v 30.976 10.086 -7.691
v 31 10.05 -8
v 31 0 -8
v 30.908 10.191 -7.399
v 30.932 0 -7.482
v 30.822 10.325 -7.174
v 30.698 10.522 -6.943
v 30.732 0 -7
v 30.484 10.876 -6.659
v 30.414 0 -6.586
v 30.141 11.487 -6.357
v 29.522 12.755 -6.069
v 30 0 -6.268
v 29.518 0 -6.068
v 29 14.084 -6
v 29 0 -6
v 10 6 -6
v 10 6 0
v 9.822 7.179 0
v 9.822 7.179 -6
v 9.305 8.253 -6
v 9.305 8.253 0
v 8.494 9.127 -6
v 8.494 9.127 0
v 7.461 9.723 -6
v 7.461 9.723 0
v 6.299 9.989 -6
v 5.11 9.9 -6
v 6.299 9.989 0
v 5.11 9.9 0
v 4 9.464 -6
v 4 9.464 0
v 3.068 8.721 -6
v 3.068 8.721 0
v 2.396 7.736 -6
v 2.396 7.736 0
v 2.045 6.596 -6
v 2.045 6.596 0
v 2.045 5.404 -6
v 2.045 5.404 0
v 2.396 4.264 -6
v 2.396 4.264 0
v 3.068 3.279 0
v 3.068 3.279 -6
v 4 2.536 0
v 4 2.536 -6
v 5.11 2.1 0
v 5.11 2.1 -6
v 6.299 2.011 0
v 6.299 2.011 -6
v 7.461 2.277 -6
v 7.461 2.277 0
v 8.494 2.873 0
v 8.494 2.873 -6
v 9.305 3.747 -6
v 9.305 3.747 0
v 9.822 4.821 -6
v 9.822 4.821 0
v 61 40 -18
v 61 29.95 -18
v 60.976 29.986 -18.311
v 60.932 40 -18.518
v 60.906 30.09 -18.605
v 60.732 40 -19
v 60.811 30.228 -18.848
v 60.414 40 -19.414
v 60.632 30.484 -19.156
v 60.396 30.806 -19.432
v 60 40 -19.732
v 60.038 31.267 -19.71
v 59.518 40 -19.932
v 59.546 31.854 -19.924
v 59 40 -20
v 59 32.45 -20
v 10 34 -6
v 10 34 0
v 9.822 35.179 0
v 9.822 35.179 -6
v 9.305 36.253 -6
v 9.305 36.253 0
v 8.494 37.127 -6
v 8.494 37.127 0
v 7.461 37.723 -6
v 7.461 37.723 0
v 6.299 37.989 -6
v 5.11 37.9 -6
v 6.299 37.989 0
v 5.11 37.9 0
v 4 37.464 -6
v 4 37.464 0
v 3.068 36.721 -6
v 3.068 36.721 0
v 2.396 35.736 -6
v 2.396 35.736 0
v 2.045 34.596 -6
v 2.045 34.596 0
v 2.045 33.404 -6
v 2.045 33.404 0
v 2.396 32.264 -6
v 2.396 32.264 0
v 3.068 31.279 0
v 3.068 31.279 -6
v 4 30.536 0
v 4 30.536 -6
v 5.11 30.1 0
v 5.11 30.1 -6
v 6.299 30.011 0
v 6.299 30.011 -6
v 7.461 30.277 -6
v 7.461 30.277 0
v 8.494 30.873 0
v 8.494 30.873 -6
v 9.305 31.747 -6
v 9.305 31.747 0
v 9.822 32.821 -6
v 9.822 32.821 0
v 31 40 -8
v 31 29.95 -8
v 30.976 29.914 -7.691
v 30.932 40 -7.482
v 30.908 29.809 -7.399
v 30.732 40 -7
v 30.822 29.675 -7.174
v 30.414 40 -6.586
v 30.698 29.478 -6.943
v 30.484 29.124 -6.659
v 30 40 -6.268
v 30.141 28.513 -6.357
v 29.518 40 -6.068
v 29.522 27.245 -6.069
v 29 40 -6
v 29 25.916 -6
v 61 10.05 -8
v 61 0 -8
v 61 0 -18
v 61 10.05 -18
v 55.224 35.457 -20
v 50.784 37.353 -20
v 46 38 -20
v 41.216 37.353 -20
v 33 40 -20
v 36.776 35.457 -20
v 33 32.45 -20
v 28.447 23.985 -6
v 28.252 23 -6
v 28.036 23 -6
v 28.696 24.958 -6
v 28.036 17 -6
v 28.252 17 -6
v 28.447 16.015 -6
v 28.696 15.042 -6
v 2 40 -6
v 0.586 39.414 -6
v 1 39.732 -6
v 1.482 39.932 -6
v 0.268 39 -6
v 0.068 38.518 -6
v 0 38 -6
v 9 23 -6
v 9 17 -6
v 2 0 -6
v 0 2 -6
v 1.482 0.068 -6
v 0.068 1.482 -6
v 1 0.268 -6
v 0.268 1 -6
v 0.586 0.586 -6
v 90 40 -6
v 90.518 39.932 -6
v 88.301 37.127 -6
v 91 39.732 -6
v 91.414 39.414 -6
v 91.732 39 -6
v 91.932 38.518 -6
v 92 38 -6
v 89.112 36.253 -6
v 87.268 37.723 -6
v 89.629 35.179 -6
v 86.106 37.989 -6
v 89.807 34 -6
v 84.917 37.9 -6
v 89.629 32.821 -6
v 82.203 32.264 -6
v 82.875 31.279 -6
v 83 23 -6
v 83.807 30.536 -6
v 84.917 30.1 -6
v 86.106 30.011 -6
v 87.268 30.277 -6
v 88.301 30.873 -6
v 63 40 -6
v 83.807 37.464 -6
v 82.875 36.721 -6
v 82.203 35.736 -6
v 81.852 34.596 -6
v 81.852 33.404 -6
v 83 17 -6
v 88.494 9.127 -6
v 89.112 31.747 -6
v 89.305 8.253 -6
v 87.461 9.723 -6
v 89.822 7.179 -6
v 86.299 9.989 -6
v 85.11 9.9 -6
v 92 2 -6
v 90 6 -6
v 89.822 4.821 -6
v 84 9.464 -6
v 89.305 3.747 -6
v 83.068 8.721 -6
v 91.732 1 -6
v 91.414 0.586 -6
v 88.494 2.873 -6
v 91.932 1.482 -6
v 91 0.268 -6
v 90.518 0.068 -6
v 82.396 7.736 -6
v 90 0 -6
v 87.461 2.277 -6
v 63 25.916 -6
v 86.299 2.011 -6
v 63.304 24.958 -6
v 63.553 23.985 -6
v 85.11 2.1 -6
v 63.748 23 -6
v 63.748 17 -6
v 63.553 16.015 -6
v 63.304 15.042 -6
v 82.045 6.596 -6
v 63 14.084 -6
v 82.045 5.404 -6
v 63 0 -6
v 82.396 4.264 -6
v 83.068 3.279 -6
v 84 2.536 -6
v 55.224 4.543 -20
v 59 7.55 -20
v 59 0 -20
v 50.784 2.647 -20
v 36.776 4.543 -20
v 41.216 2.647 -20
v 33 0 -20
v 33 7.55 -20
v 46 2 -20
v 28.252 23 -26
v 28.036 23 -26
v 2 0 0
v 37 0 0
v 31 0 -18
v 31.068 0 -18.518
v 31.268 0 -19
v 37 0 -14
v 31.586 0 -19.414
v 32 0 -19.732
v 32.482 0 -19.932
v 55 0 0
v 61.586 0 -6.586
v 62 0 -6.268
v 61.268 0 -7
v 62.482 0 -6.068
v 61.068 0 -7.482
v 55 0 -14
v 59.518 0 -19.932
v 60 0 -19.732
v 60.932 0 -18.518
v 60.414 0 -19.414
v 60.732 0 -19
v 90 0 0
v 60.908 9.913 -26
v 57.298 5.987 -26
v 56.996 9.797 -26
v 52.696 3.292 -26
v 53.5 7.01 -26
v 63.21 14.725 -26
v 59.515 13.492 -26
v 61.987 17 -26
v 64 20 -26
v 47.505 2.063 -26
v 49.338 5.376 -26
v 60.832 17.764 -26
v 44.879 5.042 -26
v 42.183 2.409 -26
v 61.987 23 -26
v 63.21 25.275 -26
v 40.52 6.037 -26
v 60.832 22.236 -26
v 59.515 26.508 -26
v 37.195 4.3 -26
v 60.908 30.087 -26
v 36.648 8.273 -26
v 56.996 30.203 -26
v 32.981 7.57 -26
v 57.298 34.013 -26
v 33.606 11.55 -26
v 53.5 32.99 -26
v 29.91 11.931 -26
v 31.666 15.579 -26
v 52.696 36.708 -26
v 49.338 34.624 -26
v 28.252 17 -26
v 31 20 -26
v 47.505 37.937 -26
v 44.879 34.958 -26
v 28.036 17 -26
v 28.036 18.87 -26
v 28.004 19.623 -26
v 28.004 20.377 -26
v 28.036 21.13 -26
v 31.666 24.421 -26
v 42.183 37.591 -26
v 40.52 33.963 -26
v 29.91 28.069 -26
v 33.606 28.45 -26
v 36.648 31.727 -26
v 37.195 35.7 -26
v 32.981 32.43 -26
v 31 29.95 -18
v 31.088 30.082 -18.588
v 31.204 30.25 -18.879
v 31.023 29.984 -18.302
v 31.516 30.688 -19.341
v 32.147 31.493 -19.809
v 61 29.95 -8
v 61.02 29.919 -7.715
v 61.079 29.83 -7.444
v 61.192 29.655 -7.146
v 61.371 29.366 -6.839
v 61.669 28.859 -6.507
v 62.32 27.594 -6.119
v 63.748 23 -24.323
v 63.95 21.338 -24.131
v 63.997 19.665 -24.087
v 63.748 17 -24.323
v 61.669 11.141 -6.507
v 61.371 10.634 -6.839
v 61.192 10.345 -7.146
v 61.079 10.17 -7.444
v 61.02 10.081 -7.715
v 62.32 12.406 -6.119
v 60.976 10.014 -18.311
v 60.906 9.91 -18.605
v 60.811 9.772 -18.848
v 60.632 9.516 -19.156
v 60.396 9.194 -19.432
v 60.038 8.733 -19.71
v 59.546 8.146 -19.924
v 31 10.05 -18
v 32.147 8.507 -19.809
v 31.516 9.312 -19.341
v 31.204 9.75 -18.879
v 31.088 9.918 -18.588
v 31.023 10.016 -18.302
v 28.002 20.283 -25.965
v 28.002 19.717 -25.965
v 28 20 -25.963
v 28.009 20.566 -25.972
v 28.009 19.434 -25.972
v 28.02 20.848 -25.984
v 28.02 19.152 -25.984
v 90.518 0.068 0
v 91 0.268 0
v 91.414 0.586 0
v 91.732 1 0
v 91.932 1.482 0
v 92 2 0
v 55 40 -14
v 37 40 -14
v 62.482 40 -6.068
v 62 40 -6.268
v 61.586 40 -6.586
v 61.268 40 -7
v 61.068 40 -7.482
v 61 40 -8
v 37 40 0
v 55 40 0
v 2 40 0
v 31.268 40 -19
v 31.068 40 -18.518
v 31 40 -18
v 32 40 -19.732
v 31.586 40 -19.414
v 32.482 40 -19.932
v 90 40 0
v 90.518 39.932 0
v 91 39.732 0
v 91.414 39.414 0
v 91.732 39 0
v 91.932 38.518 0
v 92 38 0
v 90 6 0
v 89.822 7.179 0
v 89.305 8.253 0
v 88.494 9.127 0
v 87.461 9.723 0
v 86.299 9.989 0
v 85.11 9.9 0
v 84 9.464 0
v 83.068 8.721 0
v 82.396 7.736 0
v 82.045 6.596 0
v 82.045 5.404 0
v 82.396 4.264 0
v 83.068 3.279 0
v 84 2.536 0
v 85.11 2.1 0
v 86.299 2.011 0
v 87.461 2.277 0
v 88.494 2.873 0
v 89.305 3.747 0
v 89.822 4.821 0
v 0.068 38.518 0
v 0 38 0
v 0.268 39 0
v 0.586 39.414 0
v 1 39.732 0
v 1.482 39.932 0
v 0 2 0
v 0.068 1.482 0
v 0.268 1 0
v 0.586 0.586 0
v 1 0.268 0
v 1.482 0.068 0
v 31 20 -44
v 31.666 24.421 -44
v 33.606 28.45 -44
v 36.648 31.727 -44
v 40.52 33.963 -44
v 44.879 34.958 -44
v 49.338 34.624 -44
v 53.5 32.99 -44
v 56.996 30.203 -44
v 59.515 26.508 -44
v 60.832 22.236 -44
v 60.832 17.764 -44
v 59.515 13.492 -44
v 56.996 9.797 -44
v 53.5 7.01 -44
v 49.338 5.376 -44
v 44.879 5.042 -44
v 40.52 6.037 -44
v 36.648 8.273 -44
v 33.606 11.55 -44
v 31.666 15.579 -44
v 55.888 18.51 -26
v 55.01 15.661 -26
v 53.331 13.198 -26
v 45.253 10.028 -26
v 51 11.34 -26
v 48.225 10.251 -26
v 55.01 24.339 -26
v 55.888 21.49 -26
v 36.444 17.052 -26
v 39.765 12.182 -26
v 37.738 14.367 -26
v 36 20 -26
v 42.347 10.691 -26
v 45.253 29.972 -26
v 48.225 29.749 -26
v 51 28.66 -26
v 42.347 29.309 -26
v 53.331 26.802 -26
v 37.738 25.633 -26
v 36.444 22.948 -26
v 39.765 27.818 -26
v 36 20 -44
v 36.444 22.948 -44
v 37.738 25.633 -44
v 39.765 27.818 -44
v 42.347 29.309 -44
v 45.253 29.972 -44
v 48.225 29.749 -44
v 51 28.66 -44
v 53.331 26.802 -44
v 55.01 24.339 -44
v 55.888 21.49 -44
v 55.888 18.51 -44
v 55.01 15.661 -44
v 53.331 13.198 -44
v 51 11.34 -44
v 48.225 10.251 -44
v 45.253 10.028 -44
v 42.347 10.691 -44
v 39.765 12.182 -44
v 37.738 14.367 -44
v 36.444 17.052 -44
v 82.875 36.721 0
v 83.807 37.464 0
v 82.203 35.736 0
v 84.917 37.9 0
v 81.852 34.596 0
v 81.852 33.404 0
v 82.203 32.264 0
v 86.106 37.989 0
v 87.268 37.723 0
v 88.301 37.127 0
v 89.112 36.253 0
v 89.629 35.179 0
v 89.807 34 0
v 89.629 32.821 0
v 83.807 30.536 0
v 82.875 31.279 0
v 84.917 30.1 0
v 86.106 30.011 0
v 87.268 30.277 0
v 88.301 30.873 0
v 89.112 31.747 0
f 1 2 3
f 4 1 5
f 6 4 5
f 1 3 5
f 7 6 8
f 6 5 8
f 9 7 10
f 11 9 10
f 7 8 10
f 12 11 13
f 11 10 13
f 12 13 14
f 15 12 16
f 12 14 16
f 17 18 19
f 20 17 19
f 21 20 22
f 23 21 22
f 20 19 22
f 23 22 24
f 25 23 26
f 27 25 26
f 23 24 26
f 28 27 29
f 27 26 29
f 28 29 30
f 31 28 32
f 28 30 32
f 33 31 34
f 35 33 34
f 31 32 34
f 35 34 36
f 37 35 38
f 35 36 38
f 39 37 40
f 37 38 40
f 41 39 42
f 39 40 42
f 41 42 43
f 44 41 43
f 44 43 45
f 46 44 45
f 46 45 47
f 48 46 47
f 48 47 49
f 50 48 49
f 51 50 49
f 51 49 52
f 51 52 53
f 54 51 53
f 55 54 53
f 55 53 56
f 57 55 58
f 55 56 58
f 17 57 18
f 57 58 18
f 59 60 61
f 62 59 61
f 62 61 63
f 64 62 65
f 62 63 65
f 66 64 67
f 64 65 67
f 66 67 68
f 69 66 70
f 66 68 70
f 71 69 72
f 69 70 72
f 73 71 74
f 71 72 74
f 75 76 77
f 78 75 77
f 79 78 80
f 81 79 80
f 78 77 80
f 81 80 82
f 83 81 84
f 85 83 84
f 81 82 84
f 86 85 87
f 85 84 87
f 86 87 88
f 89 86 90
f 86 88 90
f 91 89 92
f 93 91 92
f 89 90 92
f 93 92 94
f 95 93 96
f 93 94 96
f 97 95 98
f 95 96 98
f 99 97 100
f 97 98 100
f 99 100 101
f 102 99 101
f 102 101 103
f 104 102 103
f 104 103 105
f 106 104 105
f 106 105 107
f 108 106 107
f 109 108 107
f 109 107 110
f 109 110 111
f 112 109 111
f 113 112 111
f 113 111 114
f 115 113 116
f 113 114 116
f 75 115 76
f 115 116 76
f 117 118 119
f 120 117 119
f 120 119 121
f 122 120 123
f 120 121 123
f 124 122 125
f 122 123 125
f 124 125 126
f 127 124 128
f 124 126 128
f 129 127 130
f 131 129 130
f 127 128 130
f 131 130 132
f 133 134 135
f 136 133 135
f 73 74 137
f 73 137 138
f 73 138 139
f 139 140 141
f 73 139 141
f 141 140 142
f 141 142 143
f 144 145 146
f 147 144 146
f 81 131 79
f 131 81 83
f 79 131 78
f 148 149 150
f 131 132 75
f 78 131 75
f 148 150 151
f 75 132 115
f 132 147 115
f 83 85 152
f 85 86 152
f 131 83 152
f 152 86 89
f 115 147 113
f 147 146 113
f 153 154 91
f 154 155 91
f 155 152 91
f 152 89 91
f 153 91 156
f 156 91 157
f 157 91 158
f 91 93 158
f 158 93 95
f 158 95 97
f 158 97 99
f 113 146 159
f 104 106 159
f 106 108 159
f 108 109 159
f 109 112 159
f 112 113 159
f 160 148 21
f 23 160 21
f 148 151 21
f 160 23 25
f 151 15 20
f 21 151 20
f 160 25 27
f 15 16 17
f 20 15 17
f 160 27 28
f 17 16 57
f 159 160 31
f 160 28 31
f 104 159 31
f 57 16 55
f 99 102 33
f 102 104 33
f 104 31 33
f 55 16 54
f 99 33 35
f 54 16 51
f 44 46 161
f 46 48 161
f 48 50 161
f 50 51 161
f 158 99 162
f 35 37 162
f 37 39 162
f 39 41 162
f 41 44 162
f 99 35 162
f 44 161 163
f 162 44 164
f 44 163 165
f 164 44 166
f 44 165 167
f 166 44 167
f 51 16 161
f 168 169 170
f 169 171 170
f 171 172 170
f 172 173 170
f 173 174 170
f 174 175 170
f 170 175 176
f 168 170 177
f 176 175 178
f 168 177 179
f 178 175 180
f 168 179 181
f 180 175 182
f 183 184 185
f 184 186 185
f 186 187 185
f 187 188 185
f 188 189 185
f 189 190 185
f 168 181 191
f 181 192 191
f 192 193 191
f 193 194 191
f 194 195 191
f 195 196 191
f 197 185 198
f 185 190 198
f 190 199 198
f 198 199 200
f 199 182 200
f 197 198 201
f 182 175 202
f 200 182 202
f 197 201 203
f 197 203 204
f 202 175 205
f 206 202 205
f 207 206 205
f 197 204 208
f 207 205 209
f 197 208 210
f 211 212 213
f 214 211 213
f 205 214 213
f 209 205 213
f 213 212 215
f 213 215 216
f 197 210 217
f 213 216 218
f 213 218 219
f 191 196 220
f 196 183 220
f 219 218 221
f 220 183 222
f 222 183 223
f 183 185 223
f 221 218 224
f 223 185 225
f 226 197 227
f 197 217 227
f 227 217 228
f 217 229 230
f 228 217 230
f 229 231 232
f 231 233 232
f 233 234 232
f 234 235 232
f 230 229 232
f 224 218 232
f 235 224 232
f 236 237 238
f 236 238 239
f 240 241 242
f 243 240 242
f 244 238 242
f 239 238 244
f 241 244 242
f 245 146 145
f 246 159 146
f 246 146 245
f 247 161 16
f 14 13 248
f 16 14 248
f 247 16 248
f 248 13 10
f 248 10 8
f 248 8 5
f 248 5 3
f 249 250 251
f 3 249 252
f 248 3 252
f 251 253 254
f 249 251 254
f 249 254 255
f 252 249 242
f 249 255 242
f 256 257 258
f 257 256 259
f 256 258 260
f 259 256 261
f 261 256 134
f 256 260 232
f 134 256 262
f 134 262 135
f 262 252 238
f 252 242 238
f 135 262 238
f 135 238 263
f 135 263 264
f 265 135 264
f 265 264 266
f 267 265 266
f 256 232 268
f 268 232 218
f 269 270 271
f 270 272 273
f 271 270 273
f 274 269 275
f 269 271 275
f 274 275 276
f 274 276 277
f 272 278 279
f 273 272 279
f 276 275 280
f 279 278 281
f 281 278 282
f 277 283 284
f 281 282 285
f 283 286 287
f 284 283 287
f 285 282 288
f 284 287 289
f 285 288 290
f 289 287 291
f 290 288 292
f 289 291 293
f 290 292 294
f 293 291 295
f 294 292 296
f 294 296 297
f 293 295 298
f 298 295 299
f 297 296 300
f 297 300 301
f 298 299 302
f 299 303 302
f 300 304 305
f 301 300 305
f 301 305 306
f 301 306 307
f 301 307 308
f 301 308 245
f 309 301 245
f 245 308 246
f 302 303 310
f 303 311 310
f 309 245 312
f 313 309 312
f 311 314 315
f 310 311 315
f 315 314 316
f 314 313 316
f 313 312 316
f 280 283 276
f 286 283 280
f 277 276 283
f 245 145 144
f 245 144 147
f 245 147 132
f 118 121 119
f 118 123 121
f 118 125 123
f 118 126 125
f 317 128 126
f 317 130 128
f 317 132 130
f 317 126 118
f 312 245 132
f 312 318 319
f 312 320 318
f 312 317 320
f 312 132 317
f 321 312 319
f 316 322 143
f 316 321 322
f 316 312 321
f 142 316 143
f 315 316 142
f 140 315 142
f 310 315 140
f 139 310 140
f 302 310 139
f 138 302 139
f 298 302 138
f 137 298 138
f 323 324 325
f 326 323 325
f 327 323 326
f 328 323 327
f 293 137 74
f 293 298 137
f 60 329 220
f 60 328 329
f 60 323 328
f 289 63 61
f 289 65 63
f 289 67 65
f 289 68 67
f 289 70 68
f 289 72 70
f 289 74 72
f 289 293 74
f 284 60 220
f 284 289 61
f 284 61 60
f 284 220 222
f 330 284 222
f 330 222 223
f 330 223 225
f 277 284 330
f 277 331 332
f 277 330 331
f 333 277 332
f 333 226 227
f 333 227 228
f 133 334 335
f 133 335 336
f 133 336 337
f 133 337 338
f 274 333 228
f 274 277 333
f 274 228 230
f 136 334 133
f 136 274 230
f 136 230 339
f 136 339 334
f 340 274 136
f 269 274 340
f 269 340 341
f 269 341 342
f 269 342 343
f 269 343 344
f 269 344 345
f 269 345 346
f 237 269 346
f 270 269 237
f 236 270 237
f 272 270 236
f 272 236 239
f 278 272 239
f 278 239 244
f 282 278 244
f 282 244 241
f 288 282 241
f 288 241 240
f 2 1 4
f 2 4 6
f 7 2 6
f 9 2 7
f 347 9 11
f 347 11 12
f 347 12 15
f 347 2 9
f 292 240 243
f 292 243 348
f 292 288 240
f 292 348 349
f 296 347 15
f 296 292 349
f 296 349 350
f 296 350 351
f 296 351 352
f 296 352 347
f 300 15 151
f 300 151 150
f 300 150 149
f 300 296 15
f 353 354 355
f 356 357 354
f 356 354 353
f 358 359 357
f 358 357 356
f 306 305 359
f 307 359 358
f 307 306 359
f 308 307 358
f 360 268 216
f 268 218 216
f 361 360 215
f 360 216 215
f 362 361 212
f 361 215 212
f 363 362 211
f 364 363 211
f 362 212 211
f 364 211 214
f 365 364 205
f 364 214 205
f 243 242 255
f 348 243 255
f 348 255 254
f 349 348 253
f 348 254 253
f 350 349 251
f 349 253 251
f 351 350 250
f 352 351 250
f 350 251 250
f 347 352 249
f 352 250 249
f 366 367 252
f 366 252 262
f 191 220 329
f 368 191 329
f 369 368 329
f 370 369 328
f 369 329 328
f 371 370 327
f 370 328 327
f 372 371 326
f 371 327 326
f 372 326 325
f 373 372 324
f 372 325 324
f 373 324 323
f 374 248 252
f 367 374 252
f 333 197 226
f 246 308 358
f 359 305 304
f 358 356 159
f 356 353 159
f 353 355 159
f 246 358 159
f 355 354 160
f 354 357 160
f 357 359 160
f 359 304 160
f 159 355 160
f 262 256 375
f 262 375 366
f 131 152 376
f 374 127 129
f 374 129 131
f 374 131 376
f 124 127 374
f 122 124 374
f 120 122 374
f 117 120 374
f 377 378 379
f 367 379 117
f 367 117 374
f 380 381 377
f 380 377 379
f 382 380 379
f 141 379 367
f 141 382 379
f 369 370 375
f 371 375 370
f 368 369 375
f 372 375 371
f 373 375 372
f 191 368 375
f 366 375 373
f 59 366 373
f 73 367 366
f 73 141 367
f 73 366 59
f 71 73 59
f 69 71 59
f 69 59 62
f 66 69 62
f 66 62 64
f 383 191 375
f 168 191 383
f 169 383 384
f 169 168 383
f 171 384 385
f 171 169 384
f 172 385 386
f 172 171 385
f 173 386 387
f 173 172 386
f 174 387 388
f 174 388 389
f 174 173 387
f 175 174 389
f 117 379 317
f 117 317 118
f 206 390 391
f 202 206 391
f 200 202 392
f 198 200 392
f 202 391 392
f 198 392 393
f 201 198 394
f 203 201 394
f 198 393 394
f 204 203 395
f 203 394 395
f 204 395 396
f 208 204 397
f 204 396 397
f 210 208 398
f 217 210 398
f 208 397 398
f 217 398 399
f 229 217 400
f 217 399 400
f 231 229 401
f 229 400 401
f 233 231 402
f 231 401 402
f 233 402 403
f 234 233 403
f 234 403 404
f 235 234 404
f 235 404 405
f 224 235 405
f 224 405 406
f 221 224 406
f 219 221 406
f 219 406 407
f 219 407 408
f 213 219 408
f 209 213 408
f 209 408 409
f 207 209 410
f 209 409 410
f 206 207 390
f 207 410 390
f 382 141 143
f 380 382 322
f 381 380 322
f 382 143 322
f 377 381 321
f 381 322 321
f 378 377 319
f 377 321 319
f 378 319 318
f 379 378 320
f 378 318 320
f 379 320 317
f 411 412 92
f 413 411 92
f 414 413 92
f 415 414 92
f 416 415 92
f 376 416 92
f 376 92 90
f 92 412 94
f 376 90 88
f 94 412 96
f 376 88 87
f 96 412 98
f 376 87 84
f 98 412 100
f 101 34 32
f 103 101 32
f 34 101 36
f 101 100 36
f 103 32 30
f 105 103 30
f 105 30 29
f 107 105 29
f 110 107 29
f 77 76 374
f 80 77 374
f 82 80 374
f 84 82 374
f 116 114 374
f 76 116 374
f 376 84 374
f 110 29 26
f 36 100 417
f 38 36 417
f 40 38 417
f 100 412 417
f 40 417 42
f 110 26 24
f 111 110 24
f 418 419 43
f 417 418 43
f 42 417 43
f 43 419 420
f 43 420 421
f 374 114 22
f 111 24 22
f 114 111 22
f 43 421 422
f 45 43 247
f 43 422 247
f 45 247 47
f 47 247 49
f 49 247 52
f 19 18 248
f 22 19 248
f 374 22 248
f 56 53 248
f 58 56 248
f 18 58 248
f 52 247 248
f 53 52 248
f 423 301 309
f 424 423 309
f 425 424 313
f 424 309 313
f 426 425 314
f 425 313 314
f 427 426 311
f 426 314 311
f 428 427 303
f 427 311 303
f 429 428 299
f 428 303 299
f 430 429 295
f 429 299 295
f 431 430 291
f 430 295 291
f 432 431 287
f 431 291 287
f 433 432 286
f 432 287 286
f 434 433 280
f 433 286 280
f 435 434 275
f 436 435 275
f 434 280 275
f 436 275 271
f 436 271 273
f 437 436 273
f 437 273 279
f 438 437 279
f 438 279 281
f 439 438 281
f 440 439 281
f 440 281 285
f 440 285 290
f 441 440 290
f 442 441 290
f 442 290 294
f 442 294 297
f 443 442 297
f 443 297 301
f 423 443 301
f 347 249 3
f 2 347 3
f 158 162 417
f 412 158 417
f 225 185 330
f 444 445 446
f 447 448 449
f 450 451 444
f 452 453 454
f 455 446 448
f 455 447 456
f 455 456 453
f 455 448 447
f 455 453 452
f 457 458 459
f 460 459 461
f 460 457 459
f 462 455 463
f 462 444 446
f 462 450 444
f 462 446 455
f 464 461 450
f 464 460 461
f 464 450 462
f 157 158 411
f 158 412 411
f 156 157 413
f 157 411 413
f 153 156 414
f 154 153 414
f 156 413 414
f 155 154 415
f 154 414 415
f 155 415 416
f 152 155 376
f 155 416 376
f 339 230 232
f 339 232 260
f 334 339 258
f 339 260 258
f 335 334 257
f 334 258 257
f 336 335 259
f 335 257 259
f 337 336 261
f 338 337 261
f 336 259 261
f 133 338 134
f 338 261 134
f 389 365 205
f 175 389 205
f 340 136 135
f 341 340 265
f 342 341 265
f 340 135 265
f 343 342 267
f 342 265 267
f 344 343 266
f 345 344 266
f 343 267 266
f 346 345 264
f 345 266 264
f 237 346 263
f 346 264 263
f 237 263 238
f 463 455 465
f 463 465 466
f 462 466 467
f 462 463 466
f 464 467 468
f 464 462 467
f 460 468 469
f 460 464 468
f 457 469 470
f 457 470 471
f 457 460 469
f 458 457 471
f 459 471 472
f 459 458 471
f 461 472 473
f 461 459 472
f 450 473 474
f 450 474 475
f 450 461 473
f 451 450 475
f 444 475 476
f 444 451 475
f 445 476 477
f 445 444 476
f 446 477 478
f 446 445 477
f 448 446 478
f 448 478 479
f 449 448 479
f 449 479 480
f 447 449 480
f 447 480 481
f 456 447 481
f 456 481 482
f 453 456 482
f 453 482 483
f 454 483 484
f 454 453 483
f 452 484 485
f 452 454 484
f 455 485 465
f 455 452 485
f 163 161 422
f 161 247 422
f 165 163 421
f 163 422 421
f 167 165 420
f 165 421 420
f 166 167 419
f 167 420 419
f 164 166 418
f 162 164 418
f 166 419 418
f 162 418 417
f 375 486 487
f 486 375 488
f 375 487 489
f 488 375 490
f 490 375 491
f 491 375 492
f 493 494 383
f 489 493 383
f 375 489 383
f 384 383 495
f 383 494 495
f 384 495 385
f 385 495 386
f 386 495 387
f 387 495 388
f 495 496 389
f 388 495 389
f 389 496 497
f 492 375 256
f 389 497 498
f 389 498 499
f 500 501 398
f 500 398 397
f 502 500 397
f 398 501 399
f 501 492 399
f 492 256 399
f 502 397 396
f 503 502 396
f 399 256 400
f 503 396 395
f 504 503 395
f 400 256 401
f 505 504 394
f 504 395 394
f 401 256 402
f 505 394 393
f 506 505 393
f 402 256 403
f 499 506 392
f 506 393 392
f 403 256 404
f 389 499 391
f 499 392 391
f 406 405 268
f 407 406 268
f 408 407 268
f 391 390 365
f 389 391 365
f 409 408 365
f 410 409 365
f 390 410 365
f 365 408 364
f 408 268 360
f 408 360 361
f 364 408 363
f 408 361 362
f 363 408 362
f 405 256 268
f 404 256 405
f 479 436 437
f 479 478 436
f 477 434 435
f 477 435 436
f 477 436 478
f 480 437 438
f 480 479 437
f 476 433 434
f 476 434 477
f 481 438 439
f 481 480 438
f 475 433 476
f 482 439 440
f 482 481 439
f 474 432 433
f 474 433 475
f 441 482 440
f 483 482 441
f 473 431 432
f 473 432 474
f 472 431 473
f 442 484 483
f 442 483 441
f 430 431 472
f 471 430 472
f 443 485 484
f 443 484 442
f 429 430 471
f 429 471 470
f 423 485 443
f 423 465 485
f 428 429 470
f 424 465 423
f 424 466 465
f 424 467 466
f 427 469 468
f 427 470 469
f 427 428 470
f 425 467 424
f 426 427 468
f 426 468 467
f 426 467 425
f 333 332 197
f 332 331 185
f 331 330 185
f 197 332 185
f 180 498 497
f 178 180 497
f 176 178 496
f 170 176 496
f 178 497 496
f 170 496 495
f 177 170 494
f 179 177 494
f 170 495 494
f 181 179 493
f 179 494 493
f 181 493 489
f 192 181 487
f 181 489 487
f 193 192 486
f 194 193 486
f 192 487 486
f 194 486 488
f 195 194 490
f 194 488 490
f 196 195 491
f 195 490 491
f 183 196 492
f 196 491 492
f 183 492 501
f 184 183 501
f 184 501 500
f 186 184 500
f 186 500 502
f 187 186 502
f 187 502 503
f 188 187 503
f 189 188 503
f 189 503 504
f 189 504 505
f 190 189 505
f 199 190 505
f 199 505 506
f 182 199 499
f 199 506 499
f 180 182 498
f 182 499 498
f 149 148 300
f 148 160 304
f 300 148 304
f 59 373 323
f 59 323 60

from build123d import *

# Parameters (mm, degrees)
BOSS_EXTRUDE1_DEPTH = 40
BOSS_EXTRUDE2_REACH = 105.634
SKETCH2_R           = 18
SKETCH3_R           = 15
SKETCH3_R_2         = 10
BOSS_EXTRUDE3_DEPTH = 18
BOSS_EXTRUDE5_DEPTH = 3
SKETCH5_W           = 20
SKETCH5_H           = 1.869521783
BOSS_EXTRUDE6_DEPTH = 6
SKETCH6_W           = 20
SKETCH6_H           = 1.869521783
BOSS_EXTRUDE7_DEPTH = 6
SKETCH8_W           = 18
SKETCH8_H           = 14
CUT_EXTRUDE1_DEPTH  = 119.321595713
FILLET1_R           = 2
SKETCH9_R           = 4
CUT_EXTRUDE2_DEPTH  = 6


with BuildPart() as part:
    # Sketch1 → Boss-Extrude1 (new body)
    with BuildSketch(Plane(origin=(0, 0, 0), x_dir=(1, 0, 0), z_dir=(0, 1, 0))):
        with BuildLine():
            Line((0, 0), (92, 0))
            Line((92, 0), (92, 6))
            Line((92, 6), (63, 6))
            ThreePointArc((63, 6), (61.585786438, 6.585786438), (61, 8))
            Line((61, 8), (61, 18))
            ThreePointArc((61, 18), (60.414213562, 19.414213562), (59, 20))
            Line((59, 20), (33, 20))
            ThreePointArc((33, 20), (31.585786438, 19.414213562), (31, 18))
            Line((31, 18), (31, 8))
            ThreePointArc((31, 8), (30.414213562, 6.585786438), (29, 6))
            Line((29, 6), (0, 6))
            Line((0, 6), (0, 0))
        make_face()
    extrude(amount=BOSS_EXTRUDE1_DEPTH)

    # Boss-Extrude2: up to this face of the body (flat: up to its plane)
    boss_extrude2_end = Plane(part.part.faces().sort_by_distance((14.5, 20, -6))[0])
    # Sketch2 → Boss-Extrude2 (add, up to the picked face)
    with BuildSketch(Plane(origin=(0, 0, -26), x_dir=(-1, 0, 0), z_dir=(0, 0, -1)), mode=Mode.PRIVATE) as boss_extrude2_sk1:
        with Locations((-46, 20)):
            Circle(SKETCH2_R)
    boss_extrude2_tool1 = split(extrude(boss_extrude2_sk1.sketch, amount=-BOSS_EXTRUDE2_REACH, mode=Mode.PRIVATE), bisect_by=boss_extrude2_end, keep=Keep.BOTH, mode=Mode.PRIVATE)
    add(boss_extrude2_tool1.solids().sort_by(Axis((46, 20, -26), (0, 0, 1)))[0])

    # Sketch3 → Boss-Extrude3 (add)
    with BuildSketch(Plane(origin=(0, 0, -26), x_dir=(-1, 0, 0), z_dir=(0, 0, -1))):
        with Locations((-46, 20)):
            Circle(SKETCH3_R)
        with Locations((-46, 20)):
            Circle(SKETCH3_R_2, mode=Mode.SUBTRACT)
    extrude(amount=BOSS_EXTRUDE3_DEPTH)

    # Sketch4 → Boss-Extrude5 (add, symmetric)
    with BuildSketch(Plane(origin=(0, 20, 0), x_dir=(-1, 0, 0), z_dir=(0, -1, 0))):
        Polygon((-61.98666838, 26), (-83, 6), (-61.98666838, 6), align=None)
        Polygon((-28.035534547, 26), (-9, 6), (-28.035534547, 6), align=None)
    extrude(amount=BOSS_EXTRUDE5_DEPTH, both=True)

    # Sketch5 → Boss-Extrude6 (add)
    with BuildSketch(Plane(origin=(28.035534547, 0, 0), x_dir=(0, 0, -1), z_dir=(1, 0, 0))):
        with Locations((16, 17.934760891)):
            Rectangle(SKETCH5_W, SKETCH5_H)
    extrude(amount=BOSS_EXTRUDE6_DEPTH)

    # Sketch6 → Boss-Extrude7 (add)
    with BuildSketch(Plane(origin=(28.035534547, 0, 0), x_dir=(0, 0, -1), z_dir=(1, 0, 0))):
        with Locations((16, 22.065239109)):
            Rectangle(SKETCH6_W, SKETCH6_H)
    extrude(amount=BOSS_EXTRUDE7_DEPTH)

    # Sketch8 → Cut-Extrude1 (cut, through all)
    with BuildSketch(Plane(origin=(0, 60, 0), x_dir=(1, 0, 0), z_dir=(0, 1, 0))):
        with Locations((46, 7)):
            Rectangle(SKETCH8_W, SKETCH8_H)
    extrude(amount=-CUT_EXTRUDE1_DEPTH, mode=Mode.SUBTRACT)

    # Fillet1
    fillet1_edges = [part.edges().sort_by_distance(p)[0] for p in [
        (92, 40, -3),
        (92, 0, -3),
        (0, 0, -3),
        (0, 40, -3),
    ]]
    fillet(fillet1_edges, radius=FILLET1_R)

    # Sketch9 → Cut-Extrude2 (cut)
    with BuildSketch(Plane.XY):
        with Locations((86, 6)):
            Circle(SKETCH9_R)
        with Locations((85.806998085, 34)):
            Circle(SKETCH9_R)
        with Locations((6, 34)):
            Circle(SKETCH9_R)
        with Locations((6, 6)):
            Circle(SKETCH9_R)
    extrude(amount=-CUT_EXTRUDE2_DEPTH, mode=Mode.SUBTRACT)


solid = part.part
